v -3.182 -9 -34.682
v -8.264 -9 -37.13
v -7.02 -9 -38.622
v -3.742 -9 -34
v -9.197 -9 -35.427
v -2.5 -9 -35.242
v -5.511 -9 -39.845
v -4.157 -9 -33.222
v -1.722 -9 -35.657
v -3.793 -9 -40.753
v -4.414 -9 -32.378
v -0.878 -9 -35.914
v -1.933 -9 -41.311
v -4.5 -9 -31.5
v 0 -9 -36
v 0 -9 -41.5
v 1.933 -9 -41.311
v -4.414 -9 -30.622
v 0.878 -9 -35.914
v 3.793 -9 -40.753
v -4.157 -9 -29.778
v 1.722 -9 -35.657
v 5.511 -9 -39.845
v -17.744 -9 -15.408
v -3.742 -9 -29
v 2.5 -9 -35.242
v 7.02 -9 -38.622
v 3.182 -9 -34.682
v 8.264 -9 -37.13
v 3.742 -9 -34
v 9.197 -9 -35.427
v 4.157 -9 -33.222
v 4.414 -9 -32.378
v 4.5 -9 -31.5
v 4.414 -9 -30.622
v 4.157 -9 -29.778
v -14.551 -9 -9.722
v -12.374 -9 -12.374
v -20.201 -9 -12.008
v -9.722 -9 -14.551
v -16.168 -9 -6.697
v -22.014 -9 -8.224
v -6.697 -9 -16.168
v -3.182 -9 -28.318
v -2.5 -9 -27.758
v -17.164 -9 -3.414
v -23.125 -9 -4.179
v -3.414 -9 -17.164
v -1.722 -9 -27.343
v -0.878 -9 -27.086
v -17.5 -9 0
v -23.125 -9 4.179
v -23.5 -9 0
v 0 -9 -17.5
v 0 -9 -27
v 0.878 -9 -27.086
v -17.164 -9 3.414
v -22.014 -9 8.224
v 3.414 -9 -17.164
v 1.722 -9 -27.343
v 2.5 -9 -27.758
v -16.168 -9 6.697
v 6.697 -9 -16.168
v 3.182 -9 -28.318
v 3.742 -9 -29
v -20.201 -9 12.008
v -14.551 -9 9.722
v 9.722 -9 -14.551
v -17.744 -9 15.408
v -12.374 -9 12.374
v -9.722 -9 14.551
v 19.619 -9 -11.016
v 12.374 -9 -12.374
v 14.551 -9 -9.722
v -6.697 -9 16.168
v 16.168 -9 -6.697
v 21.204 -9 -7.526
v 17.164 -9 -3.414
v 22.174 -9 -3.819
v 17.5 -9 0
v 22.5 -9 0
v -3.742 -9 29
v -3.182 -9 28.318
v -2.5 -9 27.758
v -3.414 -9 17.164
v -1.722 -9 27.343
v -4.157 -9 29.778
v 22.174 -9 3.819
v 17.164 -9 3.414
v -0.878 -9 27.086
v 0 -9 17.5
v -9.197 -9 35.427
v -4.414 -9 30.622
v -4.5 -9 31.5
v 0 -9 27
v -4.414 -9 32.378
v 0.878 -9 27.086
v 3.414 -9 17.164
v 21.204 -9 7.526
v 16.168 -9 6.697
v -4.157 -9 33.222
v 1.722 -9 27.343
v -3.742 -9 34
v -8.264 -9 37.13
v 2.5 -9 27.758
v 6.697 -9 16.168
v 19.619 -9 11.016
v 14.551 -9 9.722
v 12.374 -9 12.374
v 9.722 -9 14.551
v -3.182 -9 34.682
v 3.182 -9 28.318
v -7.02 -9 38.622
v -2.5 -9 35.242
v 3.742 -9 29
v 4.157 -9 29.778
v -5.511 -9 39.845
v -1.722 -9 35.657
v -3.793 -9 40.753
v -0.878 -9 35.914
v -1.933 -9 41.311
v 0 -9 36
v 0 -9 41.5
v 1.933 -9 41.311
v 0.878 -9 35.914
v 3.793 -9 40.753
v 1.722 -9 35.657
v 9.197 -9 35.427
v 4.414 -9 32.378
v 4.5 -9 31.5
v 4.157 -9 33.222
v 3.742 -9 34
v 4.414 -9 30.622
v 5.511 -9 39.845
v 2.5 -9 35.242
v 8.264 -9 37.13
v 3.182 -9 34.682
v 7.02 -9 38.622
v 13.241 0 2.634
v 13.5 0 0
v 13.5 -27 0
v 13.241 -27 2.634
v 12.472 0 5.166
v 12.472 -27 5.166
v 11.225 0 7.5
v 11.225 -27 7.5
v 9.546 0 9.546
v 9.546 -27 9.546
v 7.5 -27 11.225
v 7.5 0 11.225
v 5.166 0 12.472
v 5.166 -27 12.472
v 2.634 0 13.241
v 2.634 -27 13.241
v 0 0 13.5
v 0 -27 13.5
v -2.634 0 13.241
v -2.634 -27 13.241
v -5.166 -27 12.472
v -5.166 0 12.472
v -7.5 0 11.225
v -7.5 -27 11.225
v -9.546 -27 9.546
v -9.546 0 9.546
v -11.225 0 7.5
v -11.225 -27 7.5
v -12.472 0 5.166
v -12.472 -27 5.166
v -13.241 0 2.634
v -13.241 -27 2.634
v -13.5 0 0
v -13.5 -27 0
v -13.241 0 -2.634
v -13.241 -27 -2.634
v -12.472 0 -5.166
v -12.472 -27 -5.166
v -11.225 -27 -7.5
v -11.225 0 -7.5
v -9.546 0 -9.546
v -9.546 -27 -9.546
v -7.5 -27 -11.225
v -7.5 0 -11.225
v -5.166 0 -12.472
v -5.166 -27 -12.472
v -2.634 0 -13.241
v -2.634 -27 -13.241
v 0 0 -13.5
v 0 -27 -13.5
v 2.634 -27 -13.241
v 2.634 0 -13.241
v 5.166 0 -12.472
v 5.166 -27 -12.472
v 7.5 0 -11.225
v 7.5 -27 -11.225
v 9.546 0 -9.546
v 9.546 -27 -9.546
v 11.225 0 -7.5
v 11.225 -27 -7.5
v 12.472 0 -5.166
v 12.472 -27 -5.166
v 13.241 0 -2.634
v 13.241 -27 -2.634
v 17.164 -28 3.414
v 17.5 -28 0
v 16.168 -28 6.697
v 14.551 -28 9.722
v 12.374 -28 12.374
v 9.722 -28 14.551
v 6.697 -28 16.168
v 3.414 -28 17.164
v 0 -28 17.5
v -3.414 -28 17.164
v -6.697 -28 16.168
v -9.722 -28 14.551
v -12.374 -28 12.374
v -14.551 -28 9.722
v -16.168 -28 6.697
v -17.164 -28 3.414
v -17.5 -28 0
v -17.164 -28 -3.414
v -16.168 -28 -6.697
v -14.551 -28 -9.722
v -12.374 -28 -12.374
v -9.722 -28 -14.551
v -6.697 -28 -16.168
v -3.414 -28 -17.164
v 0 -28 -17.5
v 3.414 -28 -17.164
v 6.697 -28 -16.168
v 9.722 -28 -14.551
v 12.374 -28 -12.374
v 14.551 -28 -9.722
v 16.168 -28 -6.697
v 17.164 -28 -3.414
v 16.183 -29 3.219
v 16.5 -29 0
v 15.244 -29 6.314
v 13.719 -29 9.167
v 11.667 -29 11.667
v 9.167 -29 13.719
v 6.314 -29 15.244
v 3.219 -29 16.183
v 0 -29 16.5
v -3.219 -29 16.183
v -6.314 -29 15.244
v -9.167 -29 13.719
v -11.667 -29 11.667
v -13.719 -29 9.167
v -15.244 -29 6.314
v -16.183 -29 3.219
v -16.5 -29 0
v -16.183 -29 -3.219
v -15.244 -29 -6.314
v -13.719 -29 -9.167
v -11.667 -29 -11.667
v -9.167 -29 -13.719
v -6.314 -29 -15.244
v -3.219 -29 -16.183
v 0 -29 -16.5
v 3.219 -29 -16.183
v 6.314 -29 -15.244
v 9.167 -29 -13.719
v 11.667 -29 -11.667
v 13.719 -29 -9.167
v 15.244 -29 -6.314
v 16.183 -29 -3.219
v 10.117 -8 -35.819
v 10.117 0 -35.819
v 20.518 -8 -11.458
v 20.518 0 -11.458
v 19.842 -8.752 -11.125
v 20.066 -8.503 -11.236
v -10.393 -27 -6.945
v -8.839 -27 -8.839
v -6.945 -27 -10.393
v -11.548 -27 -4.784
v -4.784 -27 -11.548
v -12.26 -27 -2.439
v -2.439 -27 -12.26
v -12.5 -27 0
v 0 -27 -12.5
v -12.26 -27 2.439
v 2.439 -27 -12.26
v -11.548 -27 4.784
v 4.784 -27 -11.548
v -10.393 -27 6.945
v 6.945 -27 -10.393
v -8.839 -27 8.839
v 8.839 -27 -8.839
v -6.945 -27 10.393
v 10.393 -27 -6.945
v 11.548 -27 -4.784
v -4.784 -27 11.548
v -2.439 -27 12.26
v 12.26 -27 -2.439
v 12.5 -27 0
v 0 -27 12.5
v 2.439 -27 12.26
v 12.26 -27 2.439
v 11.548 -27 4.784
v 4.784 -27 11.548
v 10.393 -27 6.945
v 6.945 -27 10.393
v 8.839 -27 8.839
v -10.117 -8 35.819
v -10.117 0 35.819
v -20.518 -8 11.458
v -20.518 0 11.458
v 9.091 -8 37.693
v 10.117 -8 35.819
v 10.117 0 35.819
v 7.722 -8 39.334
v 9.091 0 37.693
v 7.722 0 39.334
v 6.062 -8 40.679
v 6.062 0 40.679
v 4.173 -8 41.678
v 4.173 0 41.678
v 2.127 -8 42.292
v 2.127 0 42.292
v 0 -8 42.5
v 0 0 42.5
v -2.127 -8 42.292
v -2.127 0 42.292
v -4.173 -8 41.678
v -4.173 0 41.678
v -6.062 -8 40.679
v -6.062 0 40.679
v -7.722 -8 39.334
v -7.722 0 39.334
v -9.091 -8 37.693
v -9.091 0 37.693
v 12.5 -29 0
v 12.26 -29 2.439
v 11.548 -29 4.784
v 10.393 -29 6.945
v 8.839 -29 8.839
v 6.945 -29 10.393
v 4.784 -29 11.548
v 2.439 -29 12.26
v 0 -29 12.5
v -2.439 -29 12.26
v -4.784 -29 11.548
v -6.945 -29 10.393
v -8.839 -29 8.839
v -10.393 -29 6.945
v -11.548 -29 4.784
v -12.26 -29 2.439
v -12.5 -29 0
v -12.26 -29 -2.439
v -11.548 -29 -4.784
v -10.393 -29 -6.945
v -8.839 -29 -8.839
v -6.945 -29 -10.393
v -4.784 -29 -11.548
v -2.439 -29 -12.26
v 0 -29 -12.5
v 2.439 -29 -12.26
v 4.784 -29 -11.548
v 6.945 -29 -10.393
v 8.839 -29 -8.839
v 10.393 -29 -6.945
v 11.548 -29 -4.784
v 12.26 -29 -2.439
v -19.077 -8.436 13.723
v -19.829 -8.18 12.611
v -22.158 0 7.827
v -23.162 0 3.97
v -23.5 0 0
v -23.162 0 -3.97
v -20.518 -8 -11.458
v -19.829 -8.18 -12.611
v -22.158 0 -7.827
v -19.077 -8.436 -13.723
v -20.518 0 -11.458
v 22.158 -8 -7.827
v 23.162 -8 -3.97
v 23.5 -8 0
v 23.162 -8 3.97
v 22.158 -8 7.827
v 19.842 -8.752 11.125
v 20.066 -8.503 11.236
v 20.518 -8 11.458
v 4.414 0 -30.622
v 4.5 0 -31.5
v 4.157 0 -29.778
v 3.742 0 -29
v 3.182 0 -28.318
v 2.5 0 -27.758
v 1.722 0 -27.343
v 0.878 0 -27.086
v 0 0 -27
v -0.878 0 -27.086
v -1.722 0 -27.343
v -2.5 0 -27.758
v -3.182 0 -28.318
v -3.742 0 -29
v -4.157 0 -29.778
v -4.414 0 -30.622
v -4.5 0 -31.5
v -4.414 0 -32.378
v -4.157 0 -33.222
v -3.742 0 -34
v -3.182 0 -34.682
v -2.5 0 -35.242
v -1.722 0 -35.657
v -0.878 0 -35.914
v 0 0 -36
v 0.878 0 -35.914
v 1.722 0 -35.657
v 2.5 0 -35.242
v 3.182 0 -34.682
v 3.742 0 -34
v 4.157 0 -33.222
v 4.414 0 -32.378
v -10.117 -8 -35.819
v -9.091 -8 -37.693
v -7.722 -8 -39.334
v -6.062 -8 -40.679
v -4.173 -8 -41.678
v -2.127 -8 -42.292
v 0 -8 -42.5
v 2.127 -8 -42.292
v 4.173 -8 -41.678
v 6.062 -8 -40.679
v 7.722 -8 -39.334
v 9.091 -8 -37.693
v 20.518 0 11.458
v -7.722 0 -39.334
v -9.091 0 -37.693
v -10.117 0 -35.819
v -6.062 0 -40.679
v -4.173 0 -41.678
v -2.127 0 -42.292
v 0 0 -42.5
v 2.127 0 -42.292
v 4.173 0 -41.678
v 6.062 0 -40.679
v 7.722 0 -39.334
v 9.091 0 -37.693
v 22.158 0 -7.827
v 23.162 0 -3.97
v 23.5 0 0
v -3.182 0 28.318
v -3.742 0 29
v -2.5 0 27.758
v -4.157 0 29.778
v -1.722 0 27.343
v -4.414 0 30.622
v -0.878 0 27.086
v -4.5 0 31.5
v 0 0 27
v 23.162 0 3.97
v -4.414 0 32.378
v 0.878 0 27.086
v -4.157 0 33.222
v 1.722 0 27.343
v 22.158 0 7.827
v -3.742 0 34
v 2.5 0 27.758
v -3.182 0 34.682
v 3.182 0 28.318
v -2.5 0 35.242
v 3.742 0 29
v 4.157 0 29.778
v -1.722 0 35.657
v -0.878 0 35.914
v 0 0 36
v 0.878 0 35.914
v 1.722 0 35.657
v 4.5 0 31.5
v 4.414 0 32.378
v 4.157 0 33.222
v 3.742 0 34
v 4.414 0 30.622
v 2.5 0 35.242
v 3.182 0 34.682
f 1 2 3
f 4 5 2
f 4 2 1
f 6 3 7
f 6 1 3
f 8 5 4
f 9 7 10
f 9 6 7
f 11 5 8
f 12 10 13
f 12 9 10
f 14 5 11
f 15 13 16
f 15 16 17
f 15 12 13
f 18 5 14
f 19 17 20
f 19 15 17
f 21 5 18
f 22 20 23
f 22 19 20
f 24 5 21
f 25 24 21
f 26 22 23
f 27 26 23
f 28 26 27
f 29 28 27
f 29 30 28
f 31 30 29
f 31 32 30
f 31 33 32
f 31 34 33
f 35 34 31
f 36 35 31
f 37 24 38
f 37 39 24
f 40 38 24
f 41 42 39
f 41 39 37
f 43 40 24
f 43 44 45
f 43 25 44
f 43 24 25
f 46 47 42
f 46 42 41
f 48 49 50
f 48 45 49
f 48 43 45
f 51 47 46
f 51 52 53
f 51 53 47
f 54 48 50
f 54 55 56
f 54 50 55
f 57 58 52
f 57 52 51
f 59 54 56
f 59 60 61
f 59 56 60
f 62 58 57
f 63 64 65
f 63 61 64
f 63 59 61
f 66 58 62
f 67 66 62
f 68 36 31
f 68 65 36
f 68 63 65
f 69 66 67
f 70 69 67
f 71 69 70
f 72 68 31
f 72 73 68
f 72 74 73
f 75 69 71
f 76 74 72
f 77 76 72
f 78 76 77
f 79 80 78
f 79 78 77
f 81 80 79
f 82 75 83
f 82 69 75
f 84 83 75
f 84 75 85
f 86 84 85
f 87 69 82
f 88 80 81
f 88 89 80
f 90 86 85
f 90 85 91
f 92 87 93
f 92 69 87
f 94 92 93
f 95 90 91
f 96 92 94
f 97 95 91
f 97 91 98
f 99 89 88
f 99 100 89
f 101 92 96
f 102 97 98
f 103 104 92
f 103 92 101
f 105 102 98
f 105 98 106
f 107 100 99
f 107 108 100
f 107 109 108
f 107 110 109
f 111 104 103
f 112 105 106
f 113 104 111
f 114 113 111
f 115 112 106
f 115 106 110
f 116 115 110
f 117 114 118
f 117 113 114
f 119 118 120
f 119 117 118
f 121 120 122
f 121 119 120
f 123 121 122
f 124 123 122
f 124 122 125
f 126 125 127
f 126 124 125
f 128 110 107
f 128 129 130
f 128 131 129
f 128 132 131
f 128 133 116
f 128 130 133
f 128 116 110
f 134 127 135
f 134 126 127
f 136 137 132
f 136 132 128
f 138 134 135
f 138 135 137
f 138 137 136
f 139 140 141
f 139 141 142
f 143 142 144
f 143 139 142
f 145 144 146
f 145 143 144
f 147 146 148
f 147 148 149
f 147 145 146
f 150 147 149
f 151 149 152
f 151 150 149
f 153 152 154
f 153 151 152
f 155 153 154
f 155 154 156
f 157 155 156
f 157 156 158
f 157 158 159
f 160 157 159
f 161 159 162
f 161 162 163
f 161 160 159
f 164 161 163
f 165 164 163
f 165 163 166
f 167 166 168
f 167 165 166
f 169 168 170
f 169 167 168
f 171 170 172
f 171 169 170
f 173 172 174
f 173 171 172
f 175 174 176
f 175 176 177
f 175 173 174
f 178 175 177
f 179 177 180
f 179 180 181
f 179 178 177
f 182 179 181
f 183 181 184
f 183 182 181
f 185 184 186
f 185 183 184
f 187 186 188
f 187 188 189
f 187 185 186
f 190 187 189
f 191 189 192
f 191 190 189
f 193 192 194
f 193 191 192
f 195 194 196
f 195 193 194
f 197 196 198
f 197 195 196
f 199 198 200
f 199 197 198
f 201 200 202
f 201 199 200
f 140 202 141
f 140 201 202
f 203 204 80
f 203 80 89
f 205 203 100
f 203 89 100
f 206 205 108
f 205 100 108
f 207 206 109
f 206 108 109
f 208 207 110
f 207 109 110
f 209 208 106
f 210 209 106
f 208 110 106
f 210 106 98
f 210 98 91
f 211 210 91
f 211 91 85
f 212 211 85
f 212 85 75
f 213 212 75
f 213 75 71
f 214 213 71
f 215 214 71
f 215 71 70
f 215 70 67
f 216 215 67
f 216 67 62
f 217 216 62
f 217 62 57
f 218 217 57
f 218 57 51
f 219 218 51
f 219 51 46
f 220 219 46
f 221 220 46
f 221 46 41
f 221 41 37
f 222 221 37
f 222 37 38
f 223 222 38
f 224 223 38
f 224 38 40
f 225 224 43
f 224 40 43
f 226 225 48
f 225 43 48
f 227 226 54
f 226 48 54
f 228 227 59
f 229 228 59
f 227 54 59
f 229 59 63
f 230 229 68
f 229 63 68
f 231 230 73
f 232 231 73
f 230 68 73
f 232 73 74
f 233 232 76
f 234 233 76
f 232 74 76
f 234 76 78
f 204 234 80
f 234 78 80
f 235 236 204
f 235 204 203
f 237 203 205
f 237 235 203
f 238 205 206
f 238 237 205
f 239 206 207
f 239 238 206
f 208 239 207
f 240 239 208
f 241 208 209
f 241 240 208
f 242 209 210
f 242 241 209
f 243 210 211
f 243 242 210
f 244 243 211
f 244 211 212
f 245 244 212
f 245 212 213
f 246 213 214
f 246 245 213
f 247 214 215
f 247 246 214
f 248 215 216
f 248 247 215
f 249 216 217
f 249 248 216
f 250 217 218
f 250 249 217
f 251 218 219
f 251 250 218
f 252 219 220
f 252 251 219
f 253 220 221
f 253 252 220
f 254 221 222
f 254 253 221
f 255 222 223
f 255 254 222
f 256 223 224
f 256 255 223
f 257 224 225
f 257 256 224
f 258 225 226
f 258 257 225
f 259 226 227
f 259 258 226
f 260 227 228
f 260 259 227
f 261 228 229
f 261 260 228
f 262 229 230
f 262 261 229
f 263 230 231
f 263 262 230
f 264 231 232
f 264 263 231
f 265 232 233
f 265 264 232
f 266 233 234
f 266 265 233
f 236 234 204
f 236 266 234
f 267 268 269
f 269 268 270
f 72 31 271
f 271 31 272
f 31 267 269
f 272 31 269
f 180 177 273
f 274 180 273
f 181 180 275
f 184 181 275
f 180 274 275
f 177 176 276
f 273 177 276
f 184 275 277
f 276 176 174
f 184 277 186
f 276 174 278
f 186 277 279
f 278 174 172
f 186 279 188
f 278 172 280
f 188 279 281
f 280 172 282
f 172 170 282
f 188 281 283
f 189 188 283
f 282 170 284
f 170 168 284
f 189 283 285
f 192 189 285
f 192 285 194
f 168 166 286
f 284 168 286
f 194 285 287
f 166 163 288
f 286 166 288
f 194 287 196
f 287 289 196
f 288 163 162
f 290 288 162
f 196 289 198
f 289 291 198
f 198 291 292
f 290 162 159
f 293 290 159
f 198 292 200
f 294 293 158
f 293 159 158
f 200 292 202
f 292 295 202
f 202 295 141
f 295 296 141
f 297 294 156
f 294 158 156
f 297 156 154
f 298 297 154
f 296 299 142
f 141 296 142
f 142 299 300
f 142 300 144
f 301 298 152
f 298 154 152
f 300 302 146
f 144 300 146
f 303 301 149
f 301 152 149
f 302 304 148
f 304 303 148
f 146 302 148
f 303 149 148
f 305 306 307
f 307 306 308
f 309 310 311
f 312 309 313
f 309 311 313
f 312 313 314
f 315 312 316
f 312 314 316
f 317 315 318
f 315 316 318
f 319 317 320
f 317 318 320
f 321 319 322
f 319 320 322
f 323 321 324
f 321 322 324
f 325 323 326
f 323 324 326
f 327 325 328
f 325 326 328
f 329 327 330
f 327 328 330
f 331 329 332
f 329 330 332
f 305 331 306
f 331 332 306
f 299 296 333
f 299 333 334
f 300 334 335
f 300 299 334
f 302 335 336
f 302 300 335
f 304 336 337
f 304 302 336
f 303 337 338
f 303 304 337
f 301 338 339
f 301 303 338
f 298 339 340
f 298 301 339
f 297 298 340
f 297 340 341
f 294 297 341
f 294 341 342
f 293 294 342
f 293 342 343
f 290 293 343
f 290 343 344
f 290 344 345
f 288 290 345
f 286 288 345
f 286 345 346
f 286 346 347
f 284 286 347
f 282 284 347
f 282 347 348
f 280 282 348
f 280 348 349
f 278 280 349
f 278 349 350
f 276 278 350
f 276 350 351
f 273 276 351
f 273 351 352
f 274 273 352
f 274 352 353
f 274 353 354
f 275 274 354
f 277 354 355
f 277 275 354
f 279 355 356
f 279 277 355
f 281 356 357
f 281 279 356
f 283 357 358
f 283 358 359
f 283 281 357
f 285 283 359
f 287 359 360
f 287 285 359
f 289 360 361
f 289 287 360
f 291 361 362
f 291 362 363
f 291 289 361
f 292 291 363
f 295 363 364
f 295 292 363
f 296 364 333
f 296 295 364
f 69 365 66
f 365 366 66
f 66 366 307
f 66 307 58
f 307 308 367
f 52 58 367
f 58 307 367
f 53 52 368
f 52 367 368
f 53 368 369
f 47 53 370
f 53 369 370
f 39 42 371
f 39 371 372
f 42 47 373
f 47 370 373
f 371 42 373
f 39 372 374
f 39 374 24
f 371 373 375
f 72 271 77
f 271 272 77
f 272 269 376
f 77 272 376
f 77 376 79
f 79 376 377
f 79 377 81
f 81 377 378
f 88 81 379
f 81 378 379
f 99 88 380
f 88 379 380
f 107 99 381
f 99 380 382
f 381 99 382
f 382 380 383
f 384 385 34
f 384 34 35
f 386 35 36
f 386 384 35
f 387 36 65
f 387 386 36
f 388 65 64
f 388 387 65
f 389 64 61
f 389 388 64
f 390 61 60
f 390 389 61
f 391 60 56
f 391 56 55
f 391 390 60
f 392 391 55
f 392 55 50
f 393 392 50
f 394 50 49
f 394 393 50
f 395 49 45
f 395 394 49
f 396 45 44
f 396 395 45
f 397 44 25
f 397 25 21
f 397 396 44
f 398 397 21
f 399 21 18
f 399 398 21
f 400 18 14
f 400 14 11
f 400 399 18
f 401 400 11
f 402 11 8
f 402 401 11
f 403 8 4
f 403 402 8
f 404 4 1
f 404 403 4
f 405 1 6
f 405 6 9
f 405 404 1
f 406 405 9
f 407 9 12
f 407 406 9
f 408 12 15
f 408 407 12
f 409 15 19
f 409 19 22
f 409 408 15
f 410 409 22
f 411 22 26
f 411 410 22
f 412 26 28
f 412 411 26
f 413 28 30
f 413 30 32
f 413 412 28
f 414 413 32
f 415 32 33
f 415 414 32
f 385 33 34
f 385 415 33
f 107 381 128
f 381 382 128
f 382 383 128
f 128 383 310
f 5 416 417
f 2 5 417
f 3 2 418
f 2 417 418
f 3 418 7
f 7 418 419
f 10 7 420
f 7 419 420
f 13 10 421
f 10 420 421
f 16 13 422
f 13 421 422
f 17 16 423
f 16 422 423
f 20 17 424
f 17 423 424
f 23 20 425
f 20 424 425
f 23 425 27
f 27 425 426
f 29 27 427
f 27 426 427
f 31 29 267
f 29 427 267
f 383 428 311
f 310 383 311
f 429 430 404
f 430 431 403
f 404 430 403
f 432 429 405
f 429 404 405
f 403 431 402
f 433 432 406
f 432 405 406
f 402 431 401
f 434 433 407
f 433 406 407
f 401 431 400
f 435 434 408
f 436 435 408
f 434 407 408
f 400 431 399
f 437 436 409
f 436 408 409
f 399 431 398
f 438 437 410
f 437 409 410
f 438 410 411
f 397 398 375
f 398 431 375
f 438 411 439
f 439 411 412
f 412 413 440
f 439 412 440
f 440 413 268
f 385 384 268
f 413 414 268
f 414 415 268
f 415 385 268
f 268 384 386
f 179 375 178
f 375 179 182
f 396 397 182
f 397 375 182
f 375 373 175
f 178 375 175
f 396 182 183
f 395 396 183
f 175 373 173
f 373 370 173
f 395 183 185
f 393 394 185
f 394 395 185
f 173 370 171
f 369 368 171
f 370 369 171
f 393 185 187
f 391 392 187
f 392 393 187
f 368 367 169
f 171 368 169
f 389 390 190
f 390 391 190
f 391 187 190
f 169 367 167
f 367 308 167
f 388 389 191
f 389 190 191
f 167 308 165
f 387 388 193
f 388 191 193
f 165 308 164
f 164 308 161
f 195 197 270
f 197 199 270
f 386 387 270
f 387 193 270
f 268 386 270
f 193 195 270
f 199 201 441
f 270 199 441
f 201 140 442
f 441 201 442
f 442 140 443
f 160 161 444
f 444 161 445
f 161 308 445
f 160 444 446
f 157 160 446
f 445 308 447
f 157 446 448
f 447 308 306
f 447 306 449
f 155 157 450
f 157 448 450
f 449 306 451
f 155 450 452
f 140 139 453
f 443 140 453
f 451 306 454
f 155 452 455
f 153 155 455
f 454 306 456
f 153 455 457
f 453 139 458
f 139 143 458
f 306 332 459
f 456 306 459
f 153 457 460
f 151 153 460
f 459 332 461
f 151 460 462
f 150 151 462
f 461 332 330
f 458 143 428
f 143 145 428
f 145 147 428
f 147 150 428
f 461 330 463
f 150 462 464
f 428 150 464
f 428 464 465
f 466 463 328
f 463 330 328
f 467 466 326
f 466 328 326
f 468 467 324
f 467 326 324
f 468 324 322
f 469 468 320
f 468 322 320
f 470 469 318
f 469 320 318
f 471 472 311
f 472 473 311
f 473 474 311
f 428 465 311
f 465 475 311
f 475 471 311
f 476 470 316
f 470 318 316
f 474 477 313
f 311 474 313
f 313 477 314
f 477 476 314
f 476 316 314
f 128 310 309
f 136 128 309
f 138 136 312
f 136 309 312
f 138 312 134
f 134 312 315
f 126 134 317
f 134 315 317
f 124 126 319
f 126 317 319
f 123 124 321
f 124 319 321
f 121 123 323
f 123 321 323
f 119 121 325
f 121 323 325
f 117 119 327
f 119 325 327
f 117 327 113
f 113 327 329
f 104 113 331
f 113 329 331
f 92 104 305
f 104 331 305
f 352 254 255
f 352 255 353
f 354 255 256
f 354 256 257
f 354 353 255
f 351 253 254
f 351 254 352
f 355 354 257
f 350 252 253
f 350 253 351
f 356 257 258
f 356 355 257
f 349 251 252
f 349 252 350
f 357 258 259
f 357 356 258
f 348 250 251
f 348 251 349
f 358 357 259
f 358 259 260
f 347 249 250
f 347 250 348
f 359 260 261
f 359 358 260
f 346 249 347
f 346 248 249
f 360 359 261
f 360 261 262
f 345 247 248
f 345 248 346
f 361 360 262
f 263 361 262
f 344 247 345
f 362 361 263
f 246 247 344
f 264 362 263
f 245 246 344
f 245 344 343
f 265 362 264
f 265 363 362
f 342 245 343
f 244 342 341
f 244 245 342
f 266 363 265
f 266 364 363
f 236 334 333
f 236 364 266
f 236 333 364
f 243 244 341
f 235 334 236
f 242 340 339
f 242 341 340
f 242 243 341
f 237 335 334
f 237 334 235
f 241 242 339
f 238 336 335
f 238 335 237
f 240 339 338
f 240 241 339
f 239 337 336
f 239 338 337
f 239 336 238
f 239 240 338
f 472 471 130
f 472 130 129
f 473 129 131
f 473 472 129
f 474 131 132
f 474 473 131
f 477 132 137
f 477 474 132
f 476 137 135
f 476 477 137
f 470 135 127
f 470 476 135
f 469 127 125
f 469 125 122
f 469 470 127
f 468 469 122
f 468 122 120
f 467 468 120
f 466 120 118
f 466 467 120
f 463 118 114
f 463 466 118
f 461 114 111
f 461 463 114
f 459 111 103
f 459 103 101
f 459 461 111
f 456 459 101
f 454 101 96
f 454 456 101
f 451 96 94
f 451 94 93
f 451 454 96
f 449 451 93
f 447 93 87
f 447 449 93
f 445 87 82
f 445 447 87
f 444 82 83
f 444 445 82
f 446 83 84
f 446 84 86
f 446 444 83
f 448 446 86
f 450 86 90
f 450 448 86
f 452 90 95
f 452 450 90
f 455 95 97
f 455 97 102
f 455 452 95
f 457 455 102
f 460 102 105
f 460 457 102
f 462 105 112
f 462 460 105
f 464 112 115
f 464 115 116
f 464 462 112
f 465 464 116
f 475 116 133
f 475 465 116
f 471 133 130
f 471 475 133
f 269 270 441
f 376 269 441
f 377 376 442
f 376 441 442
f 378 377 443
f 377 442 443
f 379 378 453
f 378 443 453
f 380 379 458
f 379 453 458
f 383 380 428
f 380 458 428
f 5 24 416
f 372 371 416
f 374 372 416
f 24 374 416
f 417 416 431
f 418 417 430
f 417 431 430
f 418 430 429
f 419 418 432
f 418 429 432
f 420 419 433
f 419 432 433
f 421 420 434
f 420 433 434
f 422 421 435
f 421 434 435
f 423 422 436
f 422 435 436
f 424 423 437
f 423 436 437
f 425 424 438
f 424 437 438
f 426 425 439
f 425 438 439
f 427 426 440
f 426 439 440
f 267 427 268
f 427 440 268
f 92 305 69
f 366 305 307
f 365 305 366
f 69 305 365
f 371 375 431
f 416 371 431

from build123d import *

# Parameters (mm, degrees)
F0_R     = 4.5
F0_R_2   = 17.5
F1_DEPTH = 9
F0_R_3   = 13.5
F0_R_4   = 12.5
F2_DEPTH = 29
F3_DEPTH = 27
F4_SIZE  = 1


with BuildPart() as f1:
    # F0 (on Front) → F1 (new body)
    with BuildSketch(Plane.XZ):
        with BuildLine():
            Line((10.116541, -35.819212), (20.517576, -11.457707))
            ThreePointArc((20.517576, -11.457707), (23.5, 0), (20.517576, 11.457707))
            Line((20.517576, 11.457707), (10.116541, 35.819212))
            ThreePointArc((10.116541, 35.819212), (0, 42.5), (-10.116541, 35.819212))
            Line((-10.116541, 35.819212), (-20.517576, 11.457707))
            ThreePointArc((-20.517576, 11.457707), (-23.5, 0), (-20.517576, -11.457707))
            Line((-20.517576, -11.457707), (-10.116541, -35.819212))
            ThreePointArc((-10.116541, -35.819212), (0, -42.5), (10.116541, -35.819212))
        make_face()
        with Locations((0, -31.5)):
            Circle(F0_R, mode=Mode.SUBTRACT)
        Circle(F0_R_2, mode=Mode.SUBTRACT)
        with Locations((0, 31.5)):
            Circle(F0_R, mode=Mode.SUBTRACT)
    extrude(amount=F1_DEPTH)

    # F0 (on Front) → F2 (join)
    with BuildSketch(Plane.XZ):
        Circle(F0_R_2)
        Circle(F0_R_3, mode=Mode.SUBTRACT)
        Circle(F0_R_3)
        Circle(F0_R_4, mode=Mode.SUBTRACT)
    extrude(amount=F2_DEPTH)

    # F0 (on Front) → F3 (cut)
    with BuildSketch(Plane.XZ):
        Circle(F0_R_3)
        Circle(F0_R_4, mode=Mode.SUBTRACT)
    extrude(amount=F3_DEPTH, mode=Mode.SUBTRACT)

    # F4
    f4_edges = [f1.edges().sort_by_distance(p)[0] for p in [
        (-17.5, -29, 0),
        (23.5, -9, 0),
        (15.317059, -9, -23.63846),
        (15.317059, -9, 23.63846),
    ]]
    chamfer(f4_edges, length=F4_SIZE)


solid = f1.part
